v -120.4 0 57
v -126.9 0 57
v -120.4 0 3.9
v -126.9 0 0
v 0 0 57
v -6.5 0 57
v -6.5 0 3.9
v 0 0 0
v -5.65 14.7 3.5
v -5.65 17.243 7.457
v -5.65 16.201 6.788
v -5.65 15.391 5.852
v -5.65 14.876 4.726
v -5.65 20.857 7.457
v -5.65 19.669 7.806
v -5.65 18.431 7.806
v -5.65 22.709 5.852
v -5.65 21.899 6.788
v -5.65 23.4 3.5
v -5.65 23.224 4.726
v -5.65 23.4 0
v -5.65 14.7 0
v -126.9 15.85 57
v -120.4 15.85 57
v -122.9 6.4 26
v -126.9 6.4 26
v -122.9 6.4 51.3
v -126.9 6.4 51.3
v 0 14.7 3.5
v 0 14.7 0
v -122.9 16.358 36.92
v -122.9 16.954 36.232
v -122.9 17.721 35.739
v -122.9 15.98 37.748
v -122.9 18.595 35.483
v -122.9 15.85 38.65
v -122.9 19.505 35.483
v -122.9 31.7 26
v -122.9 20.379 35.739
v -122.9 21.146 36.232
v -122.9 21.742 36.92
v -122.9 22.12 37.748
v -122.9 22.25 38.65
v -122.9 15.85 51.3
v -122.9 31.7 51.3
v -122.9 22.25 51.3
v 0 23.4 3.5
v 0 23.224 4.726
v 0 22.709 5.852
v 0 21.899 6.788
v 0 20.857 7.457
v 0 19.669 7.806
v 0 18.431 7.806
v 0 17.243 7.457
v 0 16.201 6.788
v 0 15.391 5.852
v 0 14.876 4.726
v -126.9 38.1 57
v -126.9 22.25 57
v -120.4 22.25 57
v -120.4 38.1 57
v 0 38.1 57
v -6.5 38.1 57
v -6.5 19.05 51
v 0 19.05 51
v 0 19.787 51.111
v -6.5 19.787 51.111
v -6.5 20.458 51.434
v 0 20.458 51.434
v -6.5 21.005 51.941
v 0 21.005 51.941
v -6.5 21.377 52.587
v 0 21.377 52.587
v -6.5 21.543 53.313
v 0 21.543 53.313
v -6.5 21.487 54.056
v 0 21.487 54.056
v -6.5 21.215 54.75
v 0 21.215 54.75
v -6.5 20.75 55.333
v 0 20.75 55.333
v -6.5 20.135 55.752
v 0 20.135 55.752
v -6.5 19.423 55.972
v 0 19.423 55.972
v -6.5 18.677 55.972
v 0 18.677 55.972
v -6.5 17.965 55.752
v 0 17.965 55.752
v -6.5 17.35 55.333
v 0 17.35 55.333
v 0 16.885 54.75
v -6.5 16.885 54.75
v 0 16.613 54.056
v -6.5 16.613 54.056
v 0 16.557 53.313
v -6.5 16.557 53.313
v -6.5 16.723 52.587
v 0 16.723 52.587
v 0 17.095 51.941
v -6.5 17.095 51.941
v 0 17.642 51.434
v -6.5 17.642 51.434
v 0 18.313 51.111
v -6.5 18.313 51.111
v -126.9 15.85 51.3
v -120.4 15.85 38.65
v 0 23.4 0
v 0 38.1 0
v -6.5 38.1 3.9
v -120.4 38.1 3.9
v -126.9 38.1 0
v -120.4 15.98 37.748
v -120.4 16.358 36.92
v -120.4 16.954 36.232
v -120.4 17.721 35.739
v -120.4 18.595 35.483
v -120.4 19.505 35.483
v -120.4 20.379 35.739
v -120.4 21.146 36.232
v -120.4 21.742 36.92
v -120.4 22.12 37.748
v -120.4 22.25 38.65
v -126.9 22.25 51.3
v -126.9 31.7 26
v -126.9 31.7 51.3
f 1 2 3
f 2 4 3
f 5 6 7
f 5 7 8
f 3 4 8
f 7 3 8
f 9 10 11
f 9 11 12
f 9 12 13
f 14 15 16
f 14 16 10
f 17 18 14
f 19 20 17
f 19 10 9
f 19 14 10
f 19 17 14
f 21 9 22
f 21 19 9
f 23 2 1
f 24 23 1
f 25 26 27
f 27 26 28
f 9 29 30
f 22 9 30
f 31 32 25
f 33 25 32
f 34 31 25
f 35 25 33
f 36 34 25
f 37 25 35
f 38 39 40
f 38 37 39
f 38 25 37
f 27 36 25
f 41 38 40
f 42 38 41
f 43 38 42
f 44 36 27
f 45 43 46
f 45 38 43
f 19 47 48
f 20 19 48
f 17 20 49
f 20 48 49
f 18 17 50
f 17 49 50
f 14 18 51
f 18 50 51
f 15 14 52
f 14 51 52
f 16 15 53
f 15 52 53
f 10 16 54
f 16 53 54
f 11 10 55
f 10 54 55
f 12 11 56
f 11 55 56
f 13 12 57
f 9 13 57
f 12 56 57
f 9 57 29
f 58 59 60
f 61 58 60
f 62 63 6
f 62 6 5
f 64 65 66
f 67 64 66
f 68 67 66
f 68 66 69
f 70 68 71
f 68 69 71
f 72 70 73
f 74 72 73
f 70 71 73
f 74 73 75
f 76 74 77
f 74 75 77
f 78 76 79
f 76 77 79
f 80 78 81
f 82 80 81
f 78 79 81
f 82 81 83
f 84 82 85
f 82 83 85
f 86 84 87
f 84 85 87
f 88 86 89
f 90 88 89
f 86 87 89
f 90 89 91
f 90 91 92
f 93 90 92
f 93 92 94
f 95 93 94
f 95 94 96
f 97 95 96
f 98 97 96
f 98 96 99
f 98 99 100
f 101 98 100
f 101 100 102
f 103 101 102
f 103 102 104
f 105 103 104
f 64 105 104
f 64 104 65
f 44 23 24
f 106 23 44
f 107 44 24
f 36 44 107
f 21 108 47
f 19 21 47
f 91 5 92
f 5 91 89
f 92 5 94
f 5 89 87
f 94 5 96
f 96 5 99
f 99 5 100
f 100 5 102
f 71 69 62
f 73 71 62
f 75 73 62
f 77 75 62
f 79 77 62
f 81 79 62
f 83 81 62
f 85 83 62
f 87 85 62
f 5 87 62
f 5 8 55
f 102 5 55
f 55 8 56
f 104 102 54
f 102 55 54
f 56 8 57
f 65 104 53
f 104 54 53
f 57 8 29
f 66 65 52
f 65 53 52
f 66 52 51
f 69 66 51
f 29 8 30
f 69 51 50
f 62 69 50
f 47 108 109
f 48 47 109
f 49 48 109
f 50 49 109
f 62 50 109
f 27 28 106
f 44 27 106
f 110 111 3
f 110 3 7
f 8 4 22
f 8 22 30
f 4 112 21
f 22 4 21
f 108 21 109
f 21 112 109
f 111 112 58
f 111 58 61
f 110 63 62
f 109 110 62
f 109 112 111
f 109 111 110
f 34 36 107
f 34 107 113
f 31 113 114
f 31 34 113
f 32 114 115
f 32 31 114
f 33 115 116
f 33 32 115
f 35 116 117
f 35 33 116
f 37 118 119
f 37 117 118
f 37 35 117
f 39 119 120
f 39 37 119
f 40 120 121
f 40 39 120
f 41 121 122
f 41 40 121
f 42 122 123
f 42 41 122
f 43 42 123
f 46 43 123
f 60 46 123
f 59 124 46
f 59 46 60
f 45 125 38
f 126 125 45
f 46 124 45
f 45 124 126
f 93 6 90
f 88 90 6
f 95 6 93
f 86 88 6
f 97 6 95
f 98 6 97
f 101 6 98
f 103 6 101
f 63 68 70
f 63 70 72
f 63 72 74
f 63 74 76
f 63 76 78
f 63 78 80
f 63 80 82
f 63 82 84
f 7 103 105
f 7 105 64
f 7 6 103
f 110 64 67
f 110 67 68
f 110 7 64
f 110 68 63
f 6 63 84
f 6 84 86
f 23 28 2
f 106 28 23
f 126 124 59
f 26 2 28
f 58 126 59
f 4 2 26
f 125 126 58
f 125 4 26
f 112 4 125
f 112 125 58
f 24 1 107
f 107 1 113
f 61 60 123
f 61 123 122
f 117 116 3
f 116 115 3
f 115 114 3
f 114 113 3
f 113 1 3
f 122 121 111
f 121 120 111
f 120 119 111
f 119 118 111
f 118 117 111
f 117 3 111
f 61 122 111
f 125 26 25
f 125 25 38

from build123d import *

# Parameters (mm, degrees)
ESBO_O1_W                = 126.9
ESBO_O1_H                = 38.1
RESSALTO_EXTRUS_O2_DEPTH = 3.9
ESBO_O3_W                = 6.5
ESBO_O3_H                = 38.1
RESSALTO_EXTRUS_O3_DEPTH = 53.1
ESBO_O4_W                = 25.3
ESBO_O4_H                = 25.3
ESBO_O4_R                = 3.2
CORTE_EXTRUS_O1_DEPTH    = 4
CORTE_EXTRUS_O2_DEPTH    = 50
CORTE_EXTRUS_O3_DEPTH    = 5.65
ESBO_O9_R                = 2.5
CORTE_EXTRUS_O4_DEPTH    = 10


with BuildPart() as part:
    # Esboço1 → Ressalto-extrusão2 (new body)
    with BuildSketch(Plane.XY):
        with Locations((-63.45, 19.05)):
            Rectangle(ESBO_O1_W, ESBO_O1_H)
    extrude(amount=RESSALTO_EXTRUS_O2_DEPTH)

    # Esboço3 → Ressalto-extrusão3 (add)
    with BuildSketch(Plane.XY.offset(3.9)):
        with Locations((-123.65, 19.05)):
            Rectangle(ESBO_O3_W, ESBO_O3_H)
        with Locations((-3.25, 19.05)):
            Rectangle(ESBO_O3_W, ESBO_O3_H)
    extrude(amount=RESSALTO_EXTRUS_O3_DEPTH)

    # Esboço4 → Corte-extrusão1 (cut)
    with BuildSketch(Plane.ZY.offset(126.9)):
        with Locations((38.65, 19.05)):
            Rectangle(ESBO_O4_W, ESBO_O4_H)
        with Locations((38.65, 19.05)):
            Circle(ESBO_O4_R, mode=Mode.SUBTRACT)
    extrude(amount=-CORTE_EXTRUS_O1_DEPTH, mode=Mode.SUBTRACT)

    # Esboço6 → Corte-extrusão2 (cut)
    with BuildSketch(Plane.ZY.offset(126.9)):
        with BuildLine():
            Line((38.65, 22.25), (57, 22.25))
            Line((57, 22.25), (57, 15.85))
            Line((57, 15.85), (38.65, 15.85))
            ThreePointArc((38.65, 15.85), (35.45, 19.05), (38.65, 22.25))
        make_face()
    extrude(amount=-CORTE_EXTRUS_O2_DEPTH, mode=Mode.SUBTRACT)

    # Esboço7 → Corte-extrusão3 (cut)
    with BuildSketch(Plane(origin=(0, 0, 0), x_dir=(0, 0, -1), z_dir=(1, 0, 0))):
        with BuildLine():
            Line((-3.5, 14.7), (0, 14.7))
            Line((0, 14.7), (0, 23.4))
            Line((0, 23.4), (-3.5, 23.4))
            ThreePointArc((-3.5, 23.4), (-7.85, 19.05), (-3.5, 14.7))
        make_face()
    extrude(amount=-CORTE_EXTRUS_O3_DEPTH, mode=Mode.SUBTRACT)

    # Esboço9 → Corte-extrusão4 (cut)
    with BuildSketch(Plane(origin=(0, 0, 0), x_dir=(0, 0, -1), z_dir=(1, 0, 0))):
        with Locations((-53.5, 19.05)):
            Circle(ESBO_O9_R)
    extrude(amount=-CORTE_EXTRUS_O4_DEPTH, mode=Mode.SUBTRACT)


solid = part.part
